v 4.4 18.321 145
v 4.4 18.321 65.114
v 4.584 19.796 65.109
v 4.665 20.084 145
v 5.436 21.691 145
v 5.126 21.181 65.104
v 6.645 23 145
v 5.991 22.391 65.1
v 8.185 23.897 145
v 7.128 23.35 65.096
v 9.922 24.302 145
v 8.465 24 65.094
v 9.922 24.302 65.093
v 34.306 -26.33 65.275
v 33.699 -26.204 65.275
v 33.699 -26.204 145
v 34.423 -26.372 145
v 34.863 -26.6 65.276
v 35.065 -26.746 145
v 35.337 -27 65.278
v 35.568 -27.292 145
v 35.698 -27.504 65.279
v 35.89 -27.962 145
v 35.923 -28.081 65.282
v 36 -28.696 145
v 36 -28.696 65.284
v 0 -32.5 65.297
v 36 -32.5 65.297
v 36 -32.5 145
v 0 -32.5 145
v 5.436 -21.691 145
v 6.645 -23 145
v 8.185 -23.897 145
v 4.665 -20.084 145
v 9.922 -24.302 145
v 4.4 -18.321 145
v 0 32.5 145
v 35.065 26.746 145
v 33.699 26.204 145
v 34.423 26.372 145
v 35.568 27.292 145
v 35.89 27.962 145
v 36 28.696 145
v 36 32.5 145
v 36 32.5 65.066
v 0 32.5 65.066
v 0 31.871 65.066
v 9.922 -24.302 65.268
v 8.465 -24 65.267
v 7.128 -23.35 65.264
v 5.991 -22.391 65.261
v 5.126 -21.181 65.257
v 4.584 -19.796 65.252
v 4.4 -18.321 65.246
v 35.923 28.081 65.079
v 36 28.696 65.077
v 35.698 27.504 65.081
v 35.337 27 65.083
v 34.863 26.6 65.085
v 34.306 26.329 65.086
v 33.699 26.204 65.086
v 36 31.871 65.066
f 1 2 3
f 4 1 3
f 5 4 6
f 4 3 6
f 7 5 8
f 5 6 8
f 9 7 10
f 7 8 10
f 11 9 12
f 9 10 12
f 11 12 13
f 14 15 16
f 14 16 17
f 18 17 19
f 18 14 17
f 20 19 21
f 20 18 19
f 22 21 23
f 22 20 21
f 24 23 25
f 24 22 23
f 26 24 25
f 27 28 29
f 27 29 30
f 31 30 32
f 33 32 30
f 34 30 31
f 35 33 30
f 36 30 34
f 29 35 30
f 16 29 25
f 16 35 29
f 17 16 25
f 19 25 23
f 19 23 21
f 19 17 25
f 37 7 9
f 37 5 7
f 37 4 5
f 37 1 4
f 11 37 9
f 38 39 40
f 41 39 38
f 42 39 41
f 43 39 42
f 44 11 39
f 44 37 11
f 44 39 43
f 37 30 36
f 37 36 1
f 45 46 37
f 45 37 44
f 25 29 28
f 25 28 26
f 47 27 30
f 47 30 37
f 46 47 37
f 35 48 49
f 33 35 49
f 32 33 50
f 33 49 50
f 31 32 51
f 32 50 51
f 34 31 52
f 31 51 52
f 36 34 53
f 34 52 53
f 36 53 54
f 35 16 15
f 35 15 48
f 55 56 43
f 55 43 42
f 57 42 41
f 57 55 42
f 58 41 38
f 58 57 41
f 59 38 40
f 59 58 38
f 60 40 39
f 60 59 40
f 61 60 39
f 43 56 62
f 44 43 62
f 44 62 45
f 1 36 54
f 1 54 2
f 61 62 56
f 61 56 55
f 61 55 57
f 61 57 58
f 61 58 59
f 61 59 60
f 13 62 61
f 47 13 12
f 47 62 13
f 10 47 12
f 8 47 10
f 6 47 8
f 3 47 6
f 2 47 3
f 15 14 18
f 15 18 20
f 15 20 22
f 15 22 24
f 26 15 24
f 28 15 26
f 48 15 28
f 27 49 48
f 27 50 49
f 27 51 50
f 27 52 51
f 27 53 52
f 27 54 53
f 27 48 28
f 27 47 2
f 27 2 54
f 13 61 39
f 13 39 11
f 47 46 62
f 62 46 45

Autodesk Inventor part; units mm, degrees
ref_plane "Начальная плоскость" through (0, 0, 65.0657) normal (0, 0, 1) x (1, 0, 0)
ref_plane "Конечная плоскость" through (0, 0, 145) normal (0, 0, 1) x (1, 0, 0)
sketch "Эскиз" plane through (0, 0, 0) normal (0, 0, 1) x (1, 0, 0)
  line L0 (36, -32.5) -> (0, -32.5)
  line L1 (36, -32.5) -> (36, -28.696)
  line L2 (33.6994, -26.2039) -> (9.9215, -24.3017)
  line L3 (4.4, -18.3208) -> (4.4, 18.3208)
  line L4 (33.6994, 26.2039) -> (9.9215, 24.3017)
  line L5 (36, 28.696) -> (36, 32.5)
  line L6 (0, 32.5) -> (36, 32.5)
  line L7 (0, -32.5) -> (0, 32.5)
  arc A0 (4.4, -18.3208) -> (9.9215, -24.3017) centre (10.4, -18.3208) ccw
  arc A1 (9.9215, 24.3017) -> (4.4, 18.3208) centre (10.4, 18.3208) ccw
  arc A2 (36, -28.696) -> (33.6994, -26.2039) centre (33.5, -28.696) ccw
  arc A3 (33.6994, 26.2039) -> (36, 28.696) centre (33.5, 28.696) ccw
  line L8 (0, 45.5) -> (0, -45.5) construction
  line L9 (-7.2974, 0) -> (43.7847, 0) construction
  point P0 (36, -26.388)
  point P1 (4.4, -23.86)
  point P2 (4.4, 23.86)
  point P3 (36, 26.388)
  dimension "d3" = 36
  dimension "d5" = 4.4
  dimension "d7" = 65
  dimension "d9" = 8.64
  dimension "d11" = 8.64
  dimension "d13" = 6.112
  dimension "d15" = 6.112
  dimension "d22" = 6
  dimension "d23" = 2.5
  dimension "d24" = 32.5
  dimension "d25" = 0
extrude "Тело" add sketch "Эскиз" along normal up to surface (79.9343 mm away) from surface at 65.0657
sketch "Sketch3" plane through (0, 0, 0) normal (0, 0, 1) x (1, 0, 0)
  line L0 (0, 0) -> (10, 0)
ref_plane "Work Plane7" through (0, 0, 0) normal (0, -1, 0) x (1, 0, 0)
sketch "Sketch4" plane through (0, 0, 0) normal (0, -1, 0) x (1, 0, 0)
  line L0 (-2, 65.0657) -> (12, 65.0657)
  line L1 (-2, 145) -> (12, 145)
  dimension "d29" = 79.9343
ref_plane "РабПлоскость8" through (18, 50.815, 145) normal (0, 0, 1) x (1, 0, 0)
split "Разделение1" plane through (18, 50.815, 145) removes the side toward (0, 0, 1)
ref_plane "РабПлоскость9" through (18, -32.2683, 65.2966) normal (0, -0.0036, -1) x (1, 0, 0)
split "Разделение2" plane through (18, -32.2683, 65.2966) removes the side toward (0, -0.0036, -1)
equation "\"d3\" = b"
equation "\"d5\" = t1"
equation "\"d7\" = ParH"
equation "\"d9\" = msp_x1 + t2"
equation "\"d11\" = msp_x1 + t2"
equation "\"d13\" = -msp_x2 + t2"
equation "\"d15\" = -msp_x2 + t2"
equation "\"d22\" = R"
equation "\"d23\" = R1"
equation "\"d24\" = 0.5 * d7"
equation "\"d16\" = G_L"
equation "\"R1\" = 2.5"
equation "\"R\" = 6"
equation "\"t1\" = 4.4"
equation "\"t2\" = 7.2"
equation "\"ParH\" = 65"
equation "\"b\" = 36"
equation "\"msp_x1\" = 0.04 * b"
equation "\"msp_x2\" = -0.08 * t1 + 0.04 * b"
equation "\"G_L\" = d29"
equation "\"ex\" = 0"
equation "\"G_OFFSET_START\" = -65.06571"
equation "\"G_OFFSET_END\" = -65"
equation "\"d26\" = -G_OFFSET_START"
equation "\"d27\" = G_OFFSET_END + B_L"
equation "\"B_L\" = 210"
properties part number "Швеллер 6.5U-79,93 ГОСТ 8240-97" material "Сталь, мягкая, сварочная"
